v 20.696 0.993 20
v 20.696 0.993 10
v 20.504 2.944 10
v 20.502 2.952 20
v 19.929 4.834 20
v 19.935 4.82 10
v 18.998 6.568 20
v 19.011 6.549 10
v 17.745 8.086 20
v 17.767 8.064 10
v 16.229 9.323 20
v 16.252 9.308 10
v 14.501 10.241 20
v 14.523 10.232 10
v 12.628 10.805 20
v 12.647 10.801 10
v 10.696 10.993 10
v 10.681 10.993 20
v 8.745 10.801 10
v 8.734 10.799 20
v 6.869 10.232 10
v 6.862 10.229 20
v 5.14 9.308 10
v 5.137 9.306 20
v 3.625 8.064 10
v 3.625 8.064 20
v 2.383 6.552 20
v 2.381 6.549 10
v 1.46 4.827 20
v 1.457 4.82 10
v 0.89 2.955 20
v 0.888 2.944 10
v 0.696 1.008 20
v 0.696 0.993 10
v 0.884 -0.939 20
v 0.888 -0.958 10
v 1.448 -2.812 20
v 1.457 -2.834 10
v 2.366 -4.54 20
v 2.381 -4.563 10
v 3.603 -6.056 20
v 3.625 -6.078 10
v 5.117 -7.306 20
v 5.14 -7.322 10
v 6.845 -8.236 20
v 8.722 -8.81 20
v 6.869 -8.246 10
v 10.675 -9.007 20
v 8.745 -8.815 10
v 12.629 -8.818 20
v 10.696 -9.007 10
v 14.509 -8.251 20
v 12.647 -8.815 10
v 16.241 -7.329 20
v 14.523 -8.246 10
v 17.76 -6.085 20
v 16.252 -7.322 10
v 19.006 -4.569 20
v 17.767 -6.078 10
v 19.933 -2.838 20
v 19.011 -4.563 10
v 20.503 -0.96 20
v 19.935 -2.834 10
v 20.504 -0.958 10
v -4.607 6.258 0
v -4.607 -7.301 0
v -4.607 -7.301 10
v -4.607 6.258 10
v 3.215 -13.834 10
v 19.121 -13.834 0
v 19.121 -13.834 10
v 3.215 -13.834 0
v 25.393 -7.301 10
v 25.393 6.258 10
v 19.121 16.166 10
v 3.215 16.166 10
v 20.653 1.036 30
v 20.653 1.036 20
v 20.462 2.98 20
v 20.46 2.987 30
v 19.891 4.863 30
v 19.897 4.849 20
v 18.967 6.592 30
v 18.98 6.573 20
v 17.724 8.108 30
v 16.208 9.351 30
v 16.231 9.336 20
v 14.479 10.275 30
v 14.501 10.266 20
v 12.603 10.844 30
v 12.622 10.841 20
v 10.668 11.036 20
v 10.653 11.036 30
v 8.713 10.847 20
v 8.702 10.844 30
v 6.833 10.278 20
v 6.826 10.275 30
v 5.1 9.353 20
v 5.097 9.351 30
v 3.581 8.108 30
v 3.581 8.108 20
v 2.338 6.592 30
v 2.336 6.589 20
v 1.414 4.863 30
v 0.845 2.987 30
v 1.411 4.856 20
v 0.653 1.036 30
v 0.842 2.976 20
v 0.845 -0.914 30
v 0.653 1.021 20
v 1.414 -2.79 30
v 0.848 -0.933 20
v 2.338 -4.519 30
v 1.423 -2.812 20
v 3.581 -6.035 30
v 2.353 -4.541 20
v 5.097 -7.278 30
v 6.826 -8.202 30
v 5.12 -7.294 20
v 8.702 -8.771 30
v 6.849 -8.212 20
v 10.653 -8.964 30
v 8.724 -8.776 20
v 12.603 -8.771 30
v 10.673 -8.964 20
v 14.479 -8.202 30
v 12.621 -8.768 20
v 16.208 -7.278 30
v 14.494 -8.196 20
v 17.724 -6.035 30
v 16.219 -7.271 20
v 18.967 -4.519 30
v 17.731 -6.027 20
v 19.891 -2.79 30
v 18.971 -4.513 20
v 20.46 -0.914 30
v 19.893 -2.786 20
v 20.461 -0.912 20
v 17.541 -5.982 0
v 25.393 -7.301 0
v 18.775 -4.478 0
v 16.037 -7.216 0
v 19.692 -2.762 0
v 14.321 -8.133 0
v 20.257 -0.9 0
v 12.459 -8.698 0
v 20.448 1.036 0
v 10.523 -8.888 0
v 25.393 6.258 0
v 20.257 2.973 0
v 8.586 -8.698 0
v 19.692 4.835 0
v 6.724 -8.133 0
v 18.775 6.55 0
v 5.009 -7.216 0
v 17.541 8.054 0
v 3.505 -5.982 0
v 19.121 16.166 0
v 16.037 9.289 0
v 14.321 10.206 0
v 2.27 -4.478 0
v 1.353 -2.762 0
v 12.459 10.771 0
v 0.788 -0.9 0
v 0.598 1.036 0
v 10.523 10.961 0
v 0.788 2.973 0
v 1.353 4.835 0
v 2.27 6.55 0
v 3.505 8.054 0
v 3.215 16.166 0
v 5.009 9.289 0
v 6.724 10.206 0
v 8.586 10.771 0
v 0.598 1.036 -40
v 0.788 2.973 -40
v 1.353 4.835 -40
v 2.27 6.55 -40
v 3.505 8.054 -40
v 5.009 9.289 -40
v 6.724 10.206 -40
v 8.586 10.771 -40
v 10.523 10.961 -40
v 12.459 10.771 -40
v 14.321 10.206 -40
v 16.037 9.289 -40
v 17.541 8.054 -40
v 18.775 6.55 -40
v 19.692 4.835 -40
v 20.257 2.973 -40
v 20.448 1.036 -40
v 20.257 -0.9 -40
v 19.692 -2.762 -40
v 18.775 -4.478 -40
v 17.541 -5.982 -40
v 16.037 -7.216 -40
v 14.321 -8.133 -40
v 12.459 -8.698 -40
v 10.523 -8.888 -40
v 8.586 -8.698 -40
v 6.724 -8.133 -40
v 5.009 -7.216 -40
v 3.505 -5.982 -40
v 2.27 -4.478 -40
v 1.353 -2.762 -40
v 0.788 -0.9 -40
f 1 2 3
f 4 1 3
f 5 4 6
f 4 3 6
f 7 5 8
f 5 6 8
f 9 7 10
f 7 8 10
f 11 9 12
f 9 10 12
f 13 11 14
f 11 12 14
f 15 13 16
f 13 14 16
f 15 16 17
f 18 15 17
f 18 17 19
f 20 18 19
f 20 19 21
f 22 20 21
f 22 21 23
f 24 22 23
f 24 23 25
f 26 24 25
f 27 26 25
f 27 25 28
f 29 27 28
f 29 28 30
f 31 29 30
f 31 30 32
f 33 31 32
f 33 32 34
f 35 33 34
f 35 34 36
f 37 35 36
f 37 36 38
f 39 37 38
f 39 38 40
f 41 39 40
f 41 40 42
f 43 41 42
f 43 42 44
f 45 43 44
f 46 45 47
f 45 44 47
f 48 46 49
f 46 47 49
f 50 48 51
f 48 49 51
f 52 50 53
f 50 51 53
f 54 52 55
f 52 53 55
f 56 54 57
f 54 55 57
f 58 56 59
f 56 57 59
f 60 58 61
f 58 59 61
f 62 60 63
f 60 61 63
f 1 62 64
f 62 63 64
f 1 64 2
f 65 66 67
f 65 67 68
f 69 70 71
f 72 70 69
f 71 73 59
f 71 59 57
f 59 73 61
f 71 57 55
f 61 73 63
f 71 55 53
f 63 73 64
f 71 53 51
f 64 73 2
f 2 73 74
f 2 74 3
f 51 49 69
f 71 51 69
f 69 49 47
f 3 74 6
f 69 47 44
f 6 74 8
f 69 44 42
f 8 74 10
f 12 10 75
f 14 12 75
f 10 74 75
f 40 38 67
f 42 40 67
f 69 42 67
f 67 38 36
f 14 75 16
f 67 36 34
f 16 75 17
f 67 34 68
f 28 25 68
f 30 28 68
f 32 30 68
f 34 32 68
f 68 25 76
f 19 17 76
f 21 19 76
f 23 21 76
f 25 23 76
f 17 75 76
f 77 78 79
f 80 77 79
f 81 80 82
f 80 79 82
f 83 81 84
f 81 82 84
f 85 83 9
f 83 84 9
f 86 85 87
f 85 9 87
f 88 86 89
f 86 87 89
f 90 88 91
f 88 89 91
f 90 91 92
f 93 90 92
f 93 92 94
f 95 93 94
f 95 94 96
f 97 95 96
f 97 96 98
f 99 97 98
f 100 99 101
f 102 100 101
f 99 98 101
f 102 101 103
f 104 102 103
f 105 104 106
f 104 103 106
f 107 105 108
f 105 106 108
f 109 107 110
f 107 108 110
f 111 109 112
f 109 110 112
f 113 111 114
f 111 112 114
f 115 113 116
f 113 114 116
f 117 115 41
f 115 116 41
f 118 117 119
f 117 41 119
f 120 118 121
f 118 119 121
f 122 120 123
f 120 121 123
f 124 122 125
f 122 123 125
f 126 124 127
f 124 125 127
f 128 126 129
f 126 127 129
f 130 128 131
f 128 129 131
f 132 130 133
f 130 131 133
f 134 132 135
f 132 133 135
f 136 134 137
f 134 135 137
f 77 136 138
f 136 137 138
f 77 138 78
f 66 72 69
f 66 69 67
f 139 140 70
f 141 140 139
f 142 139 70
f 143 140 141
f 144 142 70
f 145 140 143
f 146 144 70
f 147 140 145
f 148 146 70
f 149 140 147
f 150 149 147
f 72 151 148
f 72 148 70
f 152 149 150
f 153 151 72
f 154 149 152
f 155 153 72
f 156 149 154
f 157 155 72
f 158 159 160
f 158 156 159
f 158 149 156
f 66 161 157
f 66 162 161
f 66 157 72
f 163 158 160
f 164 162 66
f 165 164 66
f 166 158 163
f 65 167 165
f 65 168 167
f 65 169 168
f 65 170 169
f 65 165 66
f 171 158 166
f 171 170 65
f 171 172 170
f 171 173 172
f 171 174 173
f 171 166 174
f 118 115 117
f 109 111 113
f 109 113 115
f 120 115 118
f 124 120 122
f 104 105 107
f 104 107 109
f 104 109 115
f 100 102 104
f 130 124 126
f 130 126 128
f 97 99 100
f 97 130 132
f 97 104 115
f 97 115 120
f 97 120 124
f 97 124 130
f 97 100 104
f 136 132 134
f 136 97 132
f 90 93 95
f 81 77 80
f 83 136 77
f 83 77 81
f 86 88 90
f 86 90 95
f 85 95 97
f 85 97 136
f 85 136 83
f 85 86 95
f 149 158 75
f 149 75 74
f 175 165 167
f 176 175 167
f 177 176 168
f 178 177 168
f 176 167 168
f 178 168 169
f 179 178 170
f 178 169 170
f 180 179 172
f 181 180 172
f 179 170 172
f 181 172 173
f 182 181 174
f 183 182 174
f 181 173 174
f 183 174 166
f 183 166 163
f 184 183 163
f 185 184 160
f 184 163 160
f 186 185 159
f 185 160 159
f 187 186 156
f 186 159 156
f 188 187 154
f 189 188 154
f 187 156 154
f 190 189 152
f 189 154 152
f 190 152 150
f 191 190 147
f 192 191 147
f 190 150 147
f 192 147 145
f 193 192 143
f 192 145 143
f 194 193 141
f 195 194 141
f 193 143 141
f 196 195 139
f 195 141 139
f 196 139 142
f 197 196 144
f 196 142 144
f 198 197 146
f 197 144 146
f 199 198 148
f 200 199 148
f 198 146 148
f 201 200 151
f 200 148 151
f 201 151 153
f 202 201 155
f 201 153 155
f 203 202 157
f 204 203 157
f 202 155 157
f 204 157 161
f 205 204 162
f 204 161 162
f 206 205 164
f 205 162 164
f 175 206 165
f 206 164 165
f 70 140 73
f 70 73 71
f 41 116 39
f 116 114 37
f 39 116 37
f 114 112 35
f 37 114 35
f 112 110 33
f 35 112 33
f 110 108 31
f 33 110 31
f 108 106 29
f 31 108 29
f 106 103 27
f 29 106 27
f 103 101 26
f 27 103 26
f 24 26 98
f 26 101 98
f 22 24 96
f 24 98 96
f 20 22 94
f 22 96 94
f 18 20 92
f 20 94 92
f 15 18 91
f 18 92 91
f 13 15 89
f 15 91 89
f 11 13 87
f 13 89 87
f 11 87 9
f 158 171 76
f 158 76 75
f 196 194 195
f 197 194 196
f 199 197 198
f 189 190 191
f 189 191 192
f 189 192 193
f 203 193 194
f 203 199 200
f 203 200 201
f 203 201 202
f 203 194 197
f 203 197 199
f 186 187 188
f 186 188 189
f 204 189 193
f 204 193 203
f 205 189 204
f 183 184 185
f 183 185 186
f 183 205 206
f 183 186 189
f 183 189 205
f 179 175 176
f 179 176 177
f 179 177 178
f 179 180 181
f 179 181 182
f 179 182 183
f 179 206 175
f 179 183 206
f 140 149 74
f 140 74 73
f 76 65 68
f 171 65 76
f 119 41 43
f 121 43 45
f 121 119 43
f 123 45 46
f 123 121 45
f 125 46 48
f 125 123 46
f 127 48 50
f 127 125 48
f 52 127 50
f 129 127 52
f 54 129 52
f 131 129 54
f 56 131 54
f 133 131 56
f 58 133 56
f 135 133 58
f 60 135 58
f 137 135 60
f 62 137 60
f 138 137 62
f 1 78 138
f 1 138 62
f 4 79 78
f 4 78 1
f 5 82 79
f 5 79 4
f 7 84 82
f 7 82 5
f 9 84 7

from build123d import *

# Parameters (mm, degrees)
BOSS_EXTRUDE1_DEPTH = 10
SKETCH2_R           = 10
BOSS_EXTRUDE2_DEPTH = 10
SKETCH3_R           = 10
BOSS_EXTRUDE3_DEPTH = 10
SKETCH4_R           = 9.92496084
BOSS_EXTRUDE4_DEPTH = 40


with BuildPart() as part:
    # Sketch1 → Boss-Extrude1 (new body)
    with BuildSketch(Plane.XY):
        Polygon((3.215110596, 16.166425121), (19.120786924, 16.166425121), (25.392646828, 6.257971014), (25.392646828, -7.300966184), (19.120786924, -13.833574879), (3.215110596, -13.833574879), (-4.607353172, -7.300966184), (-4.607353172, 6.257971014), align=None)
    extrude(amount=BOSS_EXTRUDE1_DEPTH)

    # Sketch2 → Boss-Extrude2 (add)
    with BuildSketch(Plane.XY.offset(10)):
        with Locations((10.695865166, 0.993157499)):
            Circle(SKETCH2_R)
    extrude(amount=BOSS_EXTRUDE2_DEPTH)

    # Sketch3 → Boss-Extrude3 (add)
    with BuildSketch(Plane.XY.offset(20)):
        with Locations((10.65254826, 1.036474405)):
            Circle(SKETCH3_R)
    extrude(amount=BOSS_EXTRUDE3_DEPTH)

    # Sketch4 → Boss-Extrude4 (add)
    with BuildSketch(Plane(origin=(0, 0, 0), x_dir=(-1, 0, 0), z_dir=(0, 0, -1))):
        with Locations((-10.522597544, 1.036474405)):
            Circle(SKETCH4_R)
    extrude(amount=BOSS_EXTRUDE4_DEPTH)


solid = part.part
